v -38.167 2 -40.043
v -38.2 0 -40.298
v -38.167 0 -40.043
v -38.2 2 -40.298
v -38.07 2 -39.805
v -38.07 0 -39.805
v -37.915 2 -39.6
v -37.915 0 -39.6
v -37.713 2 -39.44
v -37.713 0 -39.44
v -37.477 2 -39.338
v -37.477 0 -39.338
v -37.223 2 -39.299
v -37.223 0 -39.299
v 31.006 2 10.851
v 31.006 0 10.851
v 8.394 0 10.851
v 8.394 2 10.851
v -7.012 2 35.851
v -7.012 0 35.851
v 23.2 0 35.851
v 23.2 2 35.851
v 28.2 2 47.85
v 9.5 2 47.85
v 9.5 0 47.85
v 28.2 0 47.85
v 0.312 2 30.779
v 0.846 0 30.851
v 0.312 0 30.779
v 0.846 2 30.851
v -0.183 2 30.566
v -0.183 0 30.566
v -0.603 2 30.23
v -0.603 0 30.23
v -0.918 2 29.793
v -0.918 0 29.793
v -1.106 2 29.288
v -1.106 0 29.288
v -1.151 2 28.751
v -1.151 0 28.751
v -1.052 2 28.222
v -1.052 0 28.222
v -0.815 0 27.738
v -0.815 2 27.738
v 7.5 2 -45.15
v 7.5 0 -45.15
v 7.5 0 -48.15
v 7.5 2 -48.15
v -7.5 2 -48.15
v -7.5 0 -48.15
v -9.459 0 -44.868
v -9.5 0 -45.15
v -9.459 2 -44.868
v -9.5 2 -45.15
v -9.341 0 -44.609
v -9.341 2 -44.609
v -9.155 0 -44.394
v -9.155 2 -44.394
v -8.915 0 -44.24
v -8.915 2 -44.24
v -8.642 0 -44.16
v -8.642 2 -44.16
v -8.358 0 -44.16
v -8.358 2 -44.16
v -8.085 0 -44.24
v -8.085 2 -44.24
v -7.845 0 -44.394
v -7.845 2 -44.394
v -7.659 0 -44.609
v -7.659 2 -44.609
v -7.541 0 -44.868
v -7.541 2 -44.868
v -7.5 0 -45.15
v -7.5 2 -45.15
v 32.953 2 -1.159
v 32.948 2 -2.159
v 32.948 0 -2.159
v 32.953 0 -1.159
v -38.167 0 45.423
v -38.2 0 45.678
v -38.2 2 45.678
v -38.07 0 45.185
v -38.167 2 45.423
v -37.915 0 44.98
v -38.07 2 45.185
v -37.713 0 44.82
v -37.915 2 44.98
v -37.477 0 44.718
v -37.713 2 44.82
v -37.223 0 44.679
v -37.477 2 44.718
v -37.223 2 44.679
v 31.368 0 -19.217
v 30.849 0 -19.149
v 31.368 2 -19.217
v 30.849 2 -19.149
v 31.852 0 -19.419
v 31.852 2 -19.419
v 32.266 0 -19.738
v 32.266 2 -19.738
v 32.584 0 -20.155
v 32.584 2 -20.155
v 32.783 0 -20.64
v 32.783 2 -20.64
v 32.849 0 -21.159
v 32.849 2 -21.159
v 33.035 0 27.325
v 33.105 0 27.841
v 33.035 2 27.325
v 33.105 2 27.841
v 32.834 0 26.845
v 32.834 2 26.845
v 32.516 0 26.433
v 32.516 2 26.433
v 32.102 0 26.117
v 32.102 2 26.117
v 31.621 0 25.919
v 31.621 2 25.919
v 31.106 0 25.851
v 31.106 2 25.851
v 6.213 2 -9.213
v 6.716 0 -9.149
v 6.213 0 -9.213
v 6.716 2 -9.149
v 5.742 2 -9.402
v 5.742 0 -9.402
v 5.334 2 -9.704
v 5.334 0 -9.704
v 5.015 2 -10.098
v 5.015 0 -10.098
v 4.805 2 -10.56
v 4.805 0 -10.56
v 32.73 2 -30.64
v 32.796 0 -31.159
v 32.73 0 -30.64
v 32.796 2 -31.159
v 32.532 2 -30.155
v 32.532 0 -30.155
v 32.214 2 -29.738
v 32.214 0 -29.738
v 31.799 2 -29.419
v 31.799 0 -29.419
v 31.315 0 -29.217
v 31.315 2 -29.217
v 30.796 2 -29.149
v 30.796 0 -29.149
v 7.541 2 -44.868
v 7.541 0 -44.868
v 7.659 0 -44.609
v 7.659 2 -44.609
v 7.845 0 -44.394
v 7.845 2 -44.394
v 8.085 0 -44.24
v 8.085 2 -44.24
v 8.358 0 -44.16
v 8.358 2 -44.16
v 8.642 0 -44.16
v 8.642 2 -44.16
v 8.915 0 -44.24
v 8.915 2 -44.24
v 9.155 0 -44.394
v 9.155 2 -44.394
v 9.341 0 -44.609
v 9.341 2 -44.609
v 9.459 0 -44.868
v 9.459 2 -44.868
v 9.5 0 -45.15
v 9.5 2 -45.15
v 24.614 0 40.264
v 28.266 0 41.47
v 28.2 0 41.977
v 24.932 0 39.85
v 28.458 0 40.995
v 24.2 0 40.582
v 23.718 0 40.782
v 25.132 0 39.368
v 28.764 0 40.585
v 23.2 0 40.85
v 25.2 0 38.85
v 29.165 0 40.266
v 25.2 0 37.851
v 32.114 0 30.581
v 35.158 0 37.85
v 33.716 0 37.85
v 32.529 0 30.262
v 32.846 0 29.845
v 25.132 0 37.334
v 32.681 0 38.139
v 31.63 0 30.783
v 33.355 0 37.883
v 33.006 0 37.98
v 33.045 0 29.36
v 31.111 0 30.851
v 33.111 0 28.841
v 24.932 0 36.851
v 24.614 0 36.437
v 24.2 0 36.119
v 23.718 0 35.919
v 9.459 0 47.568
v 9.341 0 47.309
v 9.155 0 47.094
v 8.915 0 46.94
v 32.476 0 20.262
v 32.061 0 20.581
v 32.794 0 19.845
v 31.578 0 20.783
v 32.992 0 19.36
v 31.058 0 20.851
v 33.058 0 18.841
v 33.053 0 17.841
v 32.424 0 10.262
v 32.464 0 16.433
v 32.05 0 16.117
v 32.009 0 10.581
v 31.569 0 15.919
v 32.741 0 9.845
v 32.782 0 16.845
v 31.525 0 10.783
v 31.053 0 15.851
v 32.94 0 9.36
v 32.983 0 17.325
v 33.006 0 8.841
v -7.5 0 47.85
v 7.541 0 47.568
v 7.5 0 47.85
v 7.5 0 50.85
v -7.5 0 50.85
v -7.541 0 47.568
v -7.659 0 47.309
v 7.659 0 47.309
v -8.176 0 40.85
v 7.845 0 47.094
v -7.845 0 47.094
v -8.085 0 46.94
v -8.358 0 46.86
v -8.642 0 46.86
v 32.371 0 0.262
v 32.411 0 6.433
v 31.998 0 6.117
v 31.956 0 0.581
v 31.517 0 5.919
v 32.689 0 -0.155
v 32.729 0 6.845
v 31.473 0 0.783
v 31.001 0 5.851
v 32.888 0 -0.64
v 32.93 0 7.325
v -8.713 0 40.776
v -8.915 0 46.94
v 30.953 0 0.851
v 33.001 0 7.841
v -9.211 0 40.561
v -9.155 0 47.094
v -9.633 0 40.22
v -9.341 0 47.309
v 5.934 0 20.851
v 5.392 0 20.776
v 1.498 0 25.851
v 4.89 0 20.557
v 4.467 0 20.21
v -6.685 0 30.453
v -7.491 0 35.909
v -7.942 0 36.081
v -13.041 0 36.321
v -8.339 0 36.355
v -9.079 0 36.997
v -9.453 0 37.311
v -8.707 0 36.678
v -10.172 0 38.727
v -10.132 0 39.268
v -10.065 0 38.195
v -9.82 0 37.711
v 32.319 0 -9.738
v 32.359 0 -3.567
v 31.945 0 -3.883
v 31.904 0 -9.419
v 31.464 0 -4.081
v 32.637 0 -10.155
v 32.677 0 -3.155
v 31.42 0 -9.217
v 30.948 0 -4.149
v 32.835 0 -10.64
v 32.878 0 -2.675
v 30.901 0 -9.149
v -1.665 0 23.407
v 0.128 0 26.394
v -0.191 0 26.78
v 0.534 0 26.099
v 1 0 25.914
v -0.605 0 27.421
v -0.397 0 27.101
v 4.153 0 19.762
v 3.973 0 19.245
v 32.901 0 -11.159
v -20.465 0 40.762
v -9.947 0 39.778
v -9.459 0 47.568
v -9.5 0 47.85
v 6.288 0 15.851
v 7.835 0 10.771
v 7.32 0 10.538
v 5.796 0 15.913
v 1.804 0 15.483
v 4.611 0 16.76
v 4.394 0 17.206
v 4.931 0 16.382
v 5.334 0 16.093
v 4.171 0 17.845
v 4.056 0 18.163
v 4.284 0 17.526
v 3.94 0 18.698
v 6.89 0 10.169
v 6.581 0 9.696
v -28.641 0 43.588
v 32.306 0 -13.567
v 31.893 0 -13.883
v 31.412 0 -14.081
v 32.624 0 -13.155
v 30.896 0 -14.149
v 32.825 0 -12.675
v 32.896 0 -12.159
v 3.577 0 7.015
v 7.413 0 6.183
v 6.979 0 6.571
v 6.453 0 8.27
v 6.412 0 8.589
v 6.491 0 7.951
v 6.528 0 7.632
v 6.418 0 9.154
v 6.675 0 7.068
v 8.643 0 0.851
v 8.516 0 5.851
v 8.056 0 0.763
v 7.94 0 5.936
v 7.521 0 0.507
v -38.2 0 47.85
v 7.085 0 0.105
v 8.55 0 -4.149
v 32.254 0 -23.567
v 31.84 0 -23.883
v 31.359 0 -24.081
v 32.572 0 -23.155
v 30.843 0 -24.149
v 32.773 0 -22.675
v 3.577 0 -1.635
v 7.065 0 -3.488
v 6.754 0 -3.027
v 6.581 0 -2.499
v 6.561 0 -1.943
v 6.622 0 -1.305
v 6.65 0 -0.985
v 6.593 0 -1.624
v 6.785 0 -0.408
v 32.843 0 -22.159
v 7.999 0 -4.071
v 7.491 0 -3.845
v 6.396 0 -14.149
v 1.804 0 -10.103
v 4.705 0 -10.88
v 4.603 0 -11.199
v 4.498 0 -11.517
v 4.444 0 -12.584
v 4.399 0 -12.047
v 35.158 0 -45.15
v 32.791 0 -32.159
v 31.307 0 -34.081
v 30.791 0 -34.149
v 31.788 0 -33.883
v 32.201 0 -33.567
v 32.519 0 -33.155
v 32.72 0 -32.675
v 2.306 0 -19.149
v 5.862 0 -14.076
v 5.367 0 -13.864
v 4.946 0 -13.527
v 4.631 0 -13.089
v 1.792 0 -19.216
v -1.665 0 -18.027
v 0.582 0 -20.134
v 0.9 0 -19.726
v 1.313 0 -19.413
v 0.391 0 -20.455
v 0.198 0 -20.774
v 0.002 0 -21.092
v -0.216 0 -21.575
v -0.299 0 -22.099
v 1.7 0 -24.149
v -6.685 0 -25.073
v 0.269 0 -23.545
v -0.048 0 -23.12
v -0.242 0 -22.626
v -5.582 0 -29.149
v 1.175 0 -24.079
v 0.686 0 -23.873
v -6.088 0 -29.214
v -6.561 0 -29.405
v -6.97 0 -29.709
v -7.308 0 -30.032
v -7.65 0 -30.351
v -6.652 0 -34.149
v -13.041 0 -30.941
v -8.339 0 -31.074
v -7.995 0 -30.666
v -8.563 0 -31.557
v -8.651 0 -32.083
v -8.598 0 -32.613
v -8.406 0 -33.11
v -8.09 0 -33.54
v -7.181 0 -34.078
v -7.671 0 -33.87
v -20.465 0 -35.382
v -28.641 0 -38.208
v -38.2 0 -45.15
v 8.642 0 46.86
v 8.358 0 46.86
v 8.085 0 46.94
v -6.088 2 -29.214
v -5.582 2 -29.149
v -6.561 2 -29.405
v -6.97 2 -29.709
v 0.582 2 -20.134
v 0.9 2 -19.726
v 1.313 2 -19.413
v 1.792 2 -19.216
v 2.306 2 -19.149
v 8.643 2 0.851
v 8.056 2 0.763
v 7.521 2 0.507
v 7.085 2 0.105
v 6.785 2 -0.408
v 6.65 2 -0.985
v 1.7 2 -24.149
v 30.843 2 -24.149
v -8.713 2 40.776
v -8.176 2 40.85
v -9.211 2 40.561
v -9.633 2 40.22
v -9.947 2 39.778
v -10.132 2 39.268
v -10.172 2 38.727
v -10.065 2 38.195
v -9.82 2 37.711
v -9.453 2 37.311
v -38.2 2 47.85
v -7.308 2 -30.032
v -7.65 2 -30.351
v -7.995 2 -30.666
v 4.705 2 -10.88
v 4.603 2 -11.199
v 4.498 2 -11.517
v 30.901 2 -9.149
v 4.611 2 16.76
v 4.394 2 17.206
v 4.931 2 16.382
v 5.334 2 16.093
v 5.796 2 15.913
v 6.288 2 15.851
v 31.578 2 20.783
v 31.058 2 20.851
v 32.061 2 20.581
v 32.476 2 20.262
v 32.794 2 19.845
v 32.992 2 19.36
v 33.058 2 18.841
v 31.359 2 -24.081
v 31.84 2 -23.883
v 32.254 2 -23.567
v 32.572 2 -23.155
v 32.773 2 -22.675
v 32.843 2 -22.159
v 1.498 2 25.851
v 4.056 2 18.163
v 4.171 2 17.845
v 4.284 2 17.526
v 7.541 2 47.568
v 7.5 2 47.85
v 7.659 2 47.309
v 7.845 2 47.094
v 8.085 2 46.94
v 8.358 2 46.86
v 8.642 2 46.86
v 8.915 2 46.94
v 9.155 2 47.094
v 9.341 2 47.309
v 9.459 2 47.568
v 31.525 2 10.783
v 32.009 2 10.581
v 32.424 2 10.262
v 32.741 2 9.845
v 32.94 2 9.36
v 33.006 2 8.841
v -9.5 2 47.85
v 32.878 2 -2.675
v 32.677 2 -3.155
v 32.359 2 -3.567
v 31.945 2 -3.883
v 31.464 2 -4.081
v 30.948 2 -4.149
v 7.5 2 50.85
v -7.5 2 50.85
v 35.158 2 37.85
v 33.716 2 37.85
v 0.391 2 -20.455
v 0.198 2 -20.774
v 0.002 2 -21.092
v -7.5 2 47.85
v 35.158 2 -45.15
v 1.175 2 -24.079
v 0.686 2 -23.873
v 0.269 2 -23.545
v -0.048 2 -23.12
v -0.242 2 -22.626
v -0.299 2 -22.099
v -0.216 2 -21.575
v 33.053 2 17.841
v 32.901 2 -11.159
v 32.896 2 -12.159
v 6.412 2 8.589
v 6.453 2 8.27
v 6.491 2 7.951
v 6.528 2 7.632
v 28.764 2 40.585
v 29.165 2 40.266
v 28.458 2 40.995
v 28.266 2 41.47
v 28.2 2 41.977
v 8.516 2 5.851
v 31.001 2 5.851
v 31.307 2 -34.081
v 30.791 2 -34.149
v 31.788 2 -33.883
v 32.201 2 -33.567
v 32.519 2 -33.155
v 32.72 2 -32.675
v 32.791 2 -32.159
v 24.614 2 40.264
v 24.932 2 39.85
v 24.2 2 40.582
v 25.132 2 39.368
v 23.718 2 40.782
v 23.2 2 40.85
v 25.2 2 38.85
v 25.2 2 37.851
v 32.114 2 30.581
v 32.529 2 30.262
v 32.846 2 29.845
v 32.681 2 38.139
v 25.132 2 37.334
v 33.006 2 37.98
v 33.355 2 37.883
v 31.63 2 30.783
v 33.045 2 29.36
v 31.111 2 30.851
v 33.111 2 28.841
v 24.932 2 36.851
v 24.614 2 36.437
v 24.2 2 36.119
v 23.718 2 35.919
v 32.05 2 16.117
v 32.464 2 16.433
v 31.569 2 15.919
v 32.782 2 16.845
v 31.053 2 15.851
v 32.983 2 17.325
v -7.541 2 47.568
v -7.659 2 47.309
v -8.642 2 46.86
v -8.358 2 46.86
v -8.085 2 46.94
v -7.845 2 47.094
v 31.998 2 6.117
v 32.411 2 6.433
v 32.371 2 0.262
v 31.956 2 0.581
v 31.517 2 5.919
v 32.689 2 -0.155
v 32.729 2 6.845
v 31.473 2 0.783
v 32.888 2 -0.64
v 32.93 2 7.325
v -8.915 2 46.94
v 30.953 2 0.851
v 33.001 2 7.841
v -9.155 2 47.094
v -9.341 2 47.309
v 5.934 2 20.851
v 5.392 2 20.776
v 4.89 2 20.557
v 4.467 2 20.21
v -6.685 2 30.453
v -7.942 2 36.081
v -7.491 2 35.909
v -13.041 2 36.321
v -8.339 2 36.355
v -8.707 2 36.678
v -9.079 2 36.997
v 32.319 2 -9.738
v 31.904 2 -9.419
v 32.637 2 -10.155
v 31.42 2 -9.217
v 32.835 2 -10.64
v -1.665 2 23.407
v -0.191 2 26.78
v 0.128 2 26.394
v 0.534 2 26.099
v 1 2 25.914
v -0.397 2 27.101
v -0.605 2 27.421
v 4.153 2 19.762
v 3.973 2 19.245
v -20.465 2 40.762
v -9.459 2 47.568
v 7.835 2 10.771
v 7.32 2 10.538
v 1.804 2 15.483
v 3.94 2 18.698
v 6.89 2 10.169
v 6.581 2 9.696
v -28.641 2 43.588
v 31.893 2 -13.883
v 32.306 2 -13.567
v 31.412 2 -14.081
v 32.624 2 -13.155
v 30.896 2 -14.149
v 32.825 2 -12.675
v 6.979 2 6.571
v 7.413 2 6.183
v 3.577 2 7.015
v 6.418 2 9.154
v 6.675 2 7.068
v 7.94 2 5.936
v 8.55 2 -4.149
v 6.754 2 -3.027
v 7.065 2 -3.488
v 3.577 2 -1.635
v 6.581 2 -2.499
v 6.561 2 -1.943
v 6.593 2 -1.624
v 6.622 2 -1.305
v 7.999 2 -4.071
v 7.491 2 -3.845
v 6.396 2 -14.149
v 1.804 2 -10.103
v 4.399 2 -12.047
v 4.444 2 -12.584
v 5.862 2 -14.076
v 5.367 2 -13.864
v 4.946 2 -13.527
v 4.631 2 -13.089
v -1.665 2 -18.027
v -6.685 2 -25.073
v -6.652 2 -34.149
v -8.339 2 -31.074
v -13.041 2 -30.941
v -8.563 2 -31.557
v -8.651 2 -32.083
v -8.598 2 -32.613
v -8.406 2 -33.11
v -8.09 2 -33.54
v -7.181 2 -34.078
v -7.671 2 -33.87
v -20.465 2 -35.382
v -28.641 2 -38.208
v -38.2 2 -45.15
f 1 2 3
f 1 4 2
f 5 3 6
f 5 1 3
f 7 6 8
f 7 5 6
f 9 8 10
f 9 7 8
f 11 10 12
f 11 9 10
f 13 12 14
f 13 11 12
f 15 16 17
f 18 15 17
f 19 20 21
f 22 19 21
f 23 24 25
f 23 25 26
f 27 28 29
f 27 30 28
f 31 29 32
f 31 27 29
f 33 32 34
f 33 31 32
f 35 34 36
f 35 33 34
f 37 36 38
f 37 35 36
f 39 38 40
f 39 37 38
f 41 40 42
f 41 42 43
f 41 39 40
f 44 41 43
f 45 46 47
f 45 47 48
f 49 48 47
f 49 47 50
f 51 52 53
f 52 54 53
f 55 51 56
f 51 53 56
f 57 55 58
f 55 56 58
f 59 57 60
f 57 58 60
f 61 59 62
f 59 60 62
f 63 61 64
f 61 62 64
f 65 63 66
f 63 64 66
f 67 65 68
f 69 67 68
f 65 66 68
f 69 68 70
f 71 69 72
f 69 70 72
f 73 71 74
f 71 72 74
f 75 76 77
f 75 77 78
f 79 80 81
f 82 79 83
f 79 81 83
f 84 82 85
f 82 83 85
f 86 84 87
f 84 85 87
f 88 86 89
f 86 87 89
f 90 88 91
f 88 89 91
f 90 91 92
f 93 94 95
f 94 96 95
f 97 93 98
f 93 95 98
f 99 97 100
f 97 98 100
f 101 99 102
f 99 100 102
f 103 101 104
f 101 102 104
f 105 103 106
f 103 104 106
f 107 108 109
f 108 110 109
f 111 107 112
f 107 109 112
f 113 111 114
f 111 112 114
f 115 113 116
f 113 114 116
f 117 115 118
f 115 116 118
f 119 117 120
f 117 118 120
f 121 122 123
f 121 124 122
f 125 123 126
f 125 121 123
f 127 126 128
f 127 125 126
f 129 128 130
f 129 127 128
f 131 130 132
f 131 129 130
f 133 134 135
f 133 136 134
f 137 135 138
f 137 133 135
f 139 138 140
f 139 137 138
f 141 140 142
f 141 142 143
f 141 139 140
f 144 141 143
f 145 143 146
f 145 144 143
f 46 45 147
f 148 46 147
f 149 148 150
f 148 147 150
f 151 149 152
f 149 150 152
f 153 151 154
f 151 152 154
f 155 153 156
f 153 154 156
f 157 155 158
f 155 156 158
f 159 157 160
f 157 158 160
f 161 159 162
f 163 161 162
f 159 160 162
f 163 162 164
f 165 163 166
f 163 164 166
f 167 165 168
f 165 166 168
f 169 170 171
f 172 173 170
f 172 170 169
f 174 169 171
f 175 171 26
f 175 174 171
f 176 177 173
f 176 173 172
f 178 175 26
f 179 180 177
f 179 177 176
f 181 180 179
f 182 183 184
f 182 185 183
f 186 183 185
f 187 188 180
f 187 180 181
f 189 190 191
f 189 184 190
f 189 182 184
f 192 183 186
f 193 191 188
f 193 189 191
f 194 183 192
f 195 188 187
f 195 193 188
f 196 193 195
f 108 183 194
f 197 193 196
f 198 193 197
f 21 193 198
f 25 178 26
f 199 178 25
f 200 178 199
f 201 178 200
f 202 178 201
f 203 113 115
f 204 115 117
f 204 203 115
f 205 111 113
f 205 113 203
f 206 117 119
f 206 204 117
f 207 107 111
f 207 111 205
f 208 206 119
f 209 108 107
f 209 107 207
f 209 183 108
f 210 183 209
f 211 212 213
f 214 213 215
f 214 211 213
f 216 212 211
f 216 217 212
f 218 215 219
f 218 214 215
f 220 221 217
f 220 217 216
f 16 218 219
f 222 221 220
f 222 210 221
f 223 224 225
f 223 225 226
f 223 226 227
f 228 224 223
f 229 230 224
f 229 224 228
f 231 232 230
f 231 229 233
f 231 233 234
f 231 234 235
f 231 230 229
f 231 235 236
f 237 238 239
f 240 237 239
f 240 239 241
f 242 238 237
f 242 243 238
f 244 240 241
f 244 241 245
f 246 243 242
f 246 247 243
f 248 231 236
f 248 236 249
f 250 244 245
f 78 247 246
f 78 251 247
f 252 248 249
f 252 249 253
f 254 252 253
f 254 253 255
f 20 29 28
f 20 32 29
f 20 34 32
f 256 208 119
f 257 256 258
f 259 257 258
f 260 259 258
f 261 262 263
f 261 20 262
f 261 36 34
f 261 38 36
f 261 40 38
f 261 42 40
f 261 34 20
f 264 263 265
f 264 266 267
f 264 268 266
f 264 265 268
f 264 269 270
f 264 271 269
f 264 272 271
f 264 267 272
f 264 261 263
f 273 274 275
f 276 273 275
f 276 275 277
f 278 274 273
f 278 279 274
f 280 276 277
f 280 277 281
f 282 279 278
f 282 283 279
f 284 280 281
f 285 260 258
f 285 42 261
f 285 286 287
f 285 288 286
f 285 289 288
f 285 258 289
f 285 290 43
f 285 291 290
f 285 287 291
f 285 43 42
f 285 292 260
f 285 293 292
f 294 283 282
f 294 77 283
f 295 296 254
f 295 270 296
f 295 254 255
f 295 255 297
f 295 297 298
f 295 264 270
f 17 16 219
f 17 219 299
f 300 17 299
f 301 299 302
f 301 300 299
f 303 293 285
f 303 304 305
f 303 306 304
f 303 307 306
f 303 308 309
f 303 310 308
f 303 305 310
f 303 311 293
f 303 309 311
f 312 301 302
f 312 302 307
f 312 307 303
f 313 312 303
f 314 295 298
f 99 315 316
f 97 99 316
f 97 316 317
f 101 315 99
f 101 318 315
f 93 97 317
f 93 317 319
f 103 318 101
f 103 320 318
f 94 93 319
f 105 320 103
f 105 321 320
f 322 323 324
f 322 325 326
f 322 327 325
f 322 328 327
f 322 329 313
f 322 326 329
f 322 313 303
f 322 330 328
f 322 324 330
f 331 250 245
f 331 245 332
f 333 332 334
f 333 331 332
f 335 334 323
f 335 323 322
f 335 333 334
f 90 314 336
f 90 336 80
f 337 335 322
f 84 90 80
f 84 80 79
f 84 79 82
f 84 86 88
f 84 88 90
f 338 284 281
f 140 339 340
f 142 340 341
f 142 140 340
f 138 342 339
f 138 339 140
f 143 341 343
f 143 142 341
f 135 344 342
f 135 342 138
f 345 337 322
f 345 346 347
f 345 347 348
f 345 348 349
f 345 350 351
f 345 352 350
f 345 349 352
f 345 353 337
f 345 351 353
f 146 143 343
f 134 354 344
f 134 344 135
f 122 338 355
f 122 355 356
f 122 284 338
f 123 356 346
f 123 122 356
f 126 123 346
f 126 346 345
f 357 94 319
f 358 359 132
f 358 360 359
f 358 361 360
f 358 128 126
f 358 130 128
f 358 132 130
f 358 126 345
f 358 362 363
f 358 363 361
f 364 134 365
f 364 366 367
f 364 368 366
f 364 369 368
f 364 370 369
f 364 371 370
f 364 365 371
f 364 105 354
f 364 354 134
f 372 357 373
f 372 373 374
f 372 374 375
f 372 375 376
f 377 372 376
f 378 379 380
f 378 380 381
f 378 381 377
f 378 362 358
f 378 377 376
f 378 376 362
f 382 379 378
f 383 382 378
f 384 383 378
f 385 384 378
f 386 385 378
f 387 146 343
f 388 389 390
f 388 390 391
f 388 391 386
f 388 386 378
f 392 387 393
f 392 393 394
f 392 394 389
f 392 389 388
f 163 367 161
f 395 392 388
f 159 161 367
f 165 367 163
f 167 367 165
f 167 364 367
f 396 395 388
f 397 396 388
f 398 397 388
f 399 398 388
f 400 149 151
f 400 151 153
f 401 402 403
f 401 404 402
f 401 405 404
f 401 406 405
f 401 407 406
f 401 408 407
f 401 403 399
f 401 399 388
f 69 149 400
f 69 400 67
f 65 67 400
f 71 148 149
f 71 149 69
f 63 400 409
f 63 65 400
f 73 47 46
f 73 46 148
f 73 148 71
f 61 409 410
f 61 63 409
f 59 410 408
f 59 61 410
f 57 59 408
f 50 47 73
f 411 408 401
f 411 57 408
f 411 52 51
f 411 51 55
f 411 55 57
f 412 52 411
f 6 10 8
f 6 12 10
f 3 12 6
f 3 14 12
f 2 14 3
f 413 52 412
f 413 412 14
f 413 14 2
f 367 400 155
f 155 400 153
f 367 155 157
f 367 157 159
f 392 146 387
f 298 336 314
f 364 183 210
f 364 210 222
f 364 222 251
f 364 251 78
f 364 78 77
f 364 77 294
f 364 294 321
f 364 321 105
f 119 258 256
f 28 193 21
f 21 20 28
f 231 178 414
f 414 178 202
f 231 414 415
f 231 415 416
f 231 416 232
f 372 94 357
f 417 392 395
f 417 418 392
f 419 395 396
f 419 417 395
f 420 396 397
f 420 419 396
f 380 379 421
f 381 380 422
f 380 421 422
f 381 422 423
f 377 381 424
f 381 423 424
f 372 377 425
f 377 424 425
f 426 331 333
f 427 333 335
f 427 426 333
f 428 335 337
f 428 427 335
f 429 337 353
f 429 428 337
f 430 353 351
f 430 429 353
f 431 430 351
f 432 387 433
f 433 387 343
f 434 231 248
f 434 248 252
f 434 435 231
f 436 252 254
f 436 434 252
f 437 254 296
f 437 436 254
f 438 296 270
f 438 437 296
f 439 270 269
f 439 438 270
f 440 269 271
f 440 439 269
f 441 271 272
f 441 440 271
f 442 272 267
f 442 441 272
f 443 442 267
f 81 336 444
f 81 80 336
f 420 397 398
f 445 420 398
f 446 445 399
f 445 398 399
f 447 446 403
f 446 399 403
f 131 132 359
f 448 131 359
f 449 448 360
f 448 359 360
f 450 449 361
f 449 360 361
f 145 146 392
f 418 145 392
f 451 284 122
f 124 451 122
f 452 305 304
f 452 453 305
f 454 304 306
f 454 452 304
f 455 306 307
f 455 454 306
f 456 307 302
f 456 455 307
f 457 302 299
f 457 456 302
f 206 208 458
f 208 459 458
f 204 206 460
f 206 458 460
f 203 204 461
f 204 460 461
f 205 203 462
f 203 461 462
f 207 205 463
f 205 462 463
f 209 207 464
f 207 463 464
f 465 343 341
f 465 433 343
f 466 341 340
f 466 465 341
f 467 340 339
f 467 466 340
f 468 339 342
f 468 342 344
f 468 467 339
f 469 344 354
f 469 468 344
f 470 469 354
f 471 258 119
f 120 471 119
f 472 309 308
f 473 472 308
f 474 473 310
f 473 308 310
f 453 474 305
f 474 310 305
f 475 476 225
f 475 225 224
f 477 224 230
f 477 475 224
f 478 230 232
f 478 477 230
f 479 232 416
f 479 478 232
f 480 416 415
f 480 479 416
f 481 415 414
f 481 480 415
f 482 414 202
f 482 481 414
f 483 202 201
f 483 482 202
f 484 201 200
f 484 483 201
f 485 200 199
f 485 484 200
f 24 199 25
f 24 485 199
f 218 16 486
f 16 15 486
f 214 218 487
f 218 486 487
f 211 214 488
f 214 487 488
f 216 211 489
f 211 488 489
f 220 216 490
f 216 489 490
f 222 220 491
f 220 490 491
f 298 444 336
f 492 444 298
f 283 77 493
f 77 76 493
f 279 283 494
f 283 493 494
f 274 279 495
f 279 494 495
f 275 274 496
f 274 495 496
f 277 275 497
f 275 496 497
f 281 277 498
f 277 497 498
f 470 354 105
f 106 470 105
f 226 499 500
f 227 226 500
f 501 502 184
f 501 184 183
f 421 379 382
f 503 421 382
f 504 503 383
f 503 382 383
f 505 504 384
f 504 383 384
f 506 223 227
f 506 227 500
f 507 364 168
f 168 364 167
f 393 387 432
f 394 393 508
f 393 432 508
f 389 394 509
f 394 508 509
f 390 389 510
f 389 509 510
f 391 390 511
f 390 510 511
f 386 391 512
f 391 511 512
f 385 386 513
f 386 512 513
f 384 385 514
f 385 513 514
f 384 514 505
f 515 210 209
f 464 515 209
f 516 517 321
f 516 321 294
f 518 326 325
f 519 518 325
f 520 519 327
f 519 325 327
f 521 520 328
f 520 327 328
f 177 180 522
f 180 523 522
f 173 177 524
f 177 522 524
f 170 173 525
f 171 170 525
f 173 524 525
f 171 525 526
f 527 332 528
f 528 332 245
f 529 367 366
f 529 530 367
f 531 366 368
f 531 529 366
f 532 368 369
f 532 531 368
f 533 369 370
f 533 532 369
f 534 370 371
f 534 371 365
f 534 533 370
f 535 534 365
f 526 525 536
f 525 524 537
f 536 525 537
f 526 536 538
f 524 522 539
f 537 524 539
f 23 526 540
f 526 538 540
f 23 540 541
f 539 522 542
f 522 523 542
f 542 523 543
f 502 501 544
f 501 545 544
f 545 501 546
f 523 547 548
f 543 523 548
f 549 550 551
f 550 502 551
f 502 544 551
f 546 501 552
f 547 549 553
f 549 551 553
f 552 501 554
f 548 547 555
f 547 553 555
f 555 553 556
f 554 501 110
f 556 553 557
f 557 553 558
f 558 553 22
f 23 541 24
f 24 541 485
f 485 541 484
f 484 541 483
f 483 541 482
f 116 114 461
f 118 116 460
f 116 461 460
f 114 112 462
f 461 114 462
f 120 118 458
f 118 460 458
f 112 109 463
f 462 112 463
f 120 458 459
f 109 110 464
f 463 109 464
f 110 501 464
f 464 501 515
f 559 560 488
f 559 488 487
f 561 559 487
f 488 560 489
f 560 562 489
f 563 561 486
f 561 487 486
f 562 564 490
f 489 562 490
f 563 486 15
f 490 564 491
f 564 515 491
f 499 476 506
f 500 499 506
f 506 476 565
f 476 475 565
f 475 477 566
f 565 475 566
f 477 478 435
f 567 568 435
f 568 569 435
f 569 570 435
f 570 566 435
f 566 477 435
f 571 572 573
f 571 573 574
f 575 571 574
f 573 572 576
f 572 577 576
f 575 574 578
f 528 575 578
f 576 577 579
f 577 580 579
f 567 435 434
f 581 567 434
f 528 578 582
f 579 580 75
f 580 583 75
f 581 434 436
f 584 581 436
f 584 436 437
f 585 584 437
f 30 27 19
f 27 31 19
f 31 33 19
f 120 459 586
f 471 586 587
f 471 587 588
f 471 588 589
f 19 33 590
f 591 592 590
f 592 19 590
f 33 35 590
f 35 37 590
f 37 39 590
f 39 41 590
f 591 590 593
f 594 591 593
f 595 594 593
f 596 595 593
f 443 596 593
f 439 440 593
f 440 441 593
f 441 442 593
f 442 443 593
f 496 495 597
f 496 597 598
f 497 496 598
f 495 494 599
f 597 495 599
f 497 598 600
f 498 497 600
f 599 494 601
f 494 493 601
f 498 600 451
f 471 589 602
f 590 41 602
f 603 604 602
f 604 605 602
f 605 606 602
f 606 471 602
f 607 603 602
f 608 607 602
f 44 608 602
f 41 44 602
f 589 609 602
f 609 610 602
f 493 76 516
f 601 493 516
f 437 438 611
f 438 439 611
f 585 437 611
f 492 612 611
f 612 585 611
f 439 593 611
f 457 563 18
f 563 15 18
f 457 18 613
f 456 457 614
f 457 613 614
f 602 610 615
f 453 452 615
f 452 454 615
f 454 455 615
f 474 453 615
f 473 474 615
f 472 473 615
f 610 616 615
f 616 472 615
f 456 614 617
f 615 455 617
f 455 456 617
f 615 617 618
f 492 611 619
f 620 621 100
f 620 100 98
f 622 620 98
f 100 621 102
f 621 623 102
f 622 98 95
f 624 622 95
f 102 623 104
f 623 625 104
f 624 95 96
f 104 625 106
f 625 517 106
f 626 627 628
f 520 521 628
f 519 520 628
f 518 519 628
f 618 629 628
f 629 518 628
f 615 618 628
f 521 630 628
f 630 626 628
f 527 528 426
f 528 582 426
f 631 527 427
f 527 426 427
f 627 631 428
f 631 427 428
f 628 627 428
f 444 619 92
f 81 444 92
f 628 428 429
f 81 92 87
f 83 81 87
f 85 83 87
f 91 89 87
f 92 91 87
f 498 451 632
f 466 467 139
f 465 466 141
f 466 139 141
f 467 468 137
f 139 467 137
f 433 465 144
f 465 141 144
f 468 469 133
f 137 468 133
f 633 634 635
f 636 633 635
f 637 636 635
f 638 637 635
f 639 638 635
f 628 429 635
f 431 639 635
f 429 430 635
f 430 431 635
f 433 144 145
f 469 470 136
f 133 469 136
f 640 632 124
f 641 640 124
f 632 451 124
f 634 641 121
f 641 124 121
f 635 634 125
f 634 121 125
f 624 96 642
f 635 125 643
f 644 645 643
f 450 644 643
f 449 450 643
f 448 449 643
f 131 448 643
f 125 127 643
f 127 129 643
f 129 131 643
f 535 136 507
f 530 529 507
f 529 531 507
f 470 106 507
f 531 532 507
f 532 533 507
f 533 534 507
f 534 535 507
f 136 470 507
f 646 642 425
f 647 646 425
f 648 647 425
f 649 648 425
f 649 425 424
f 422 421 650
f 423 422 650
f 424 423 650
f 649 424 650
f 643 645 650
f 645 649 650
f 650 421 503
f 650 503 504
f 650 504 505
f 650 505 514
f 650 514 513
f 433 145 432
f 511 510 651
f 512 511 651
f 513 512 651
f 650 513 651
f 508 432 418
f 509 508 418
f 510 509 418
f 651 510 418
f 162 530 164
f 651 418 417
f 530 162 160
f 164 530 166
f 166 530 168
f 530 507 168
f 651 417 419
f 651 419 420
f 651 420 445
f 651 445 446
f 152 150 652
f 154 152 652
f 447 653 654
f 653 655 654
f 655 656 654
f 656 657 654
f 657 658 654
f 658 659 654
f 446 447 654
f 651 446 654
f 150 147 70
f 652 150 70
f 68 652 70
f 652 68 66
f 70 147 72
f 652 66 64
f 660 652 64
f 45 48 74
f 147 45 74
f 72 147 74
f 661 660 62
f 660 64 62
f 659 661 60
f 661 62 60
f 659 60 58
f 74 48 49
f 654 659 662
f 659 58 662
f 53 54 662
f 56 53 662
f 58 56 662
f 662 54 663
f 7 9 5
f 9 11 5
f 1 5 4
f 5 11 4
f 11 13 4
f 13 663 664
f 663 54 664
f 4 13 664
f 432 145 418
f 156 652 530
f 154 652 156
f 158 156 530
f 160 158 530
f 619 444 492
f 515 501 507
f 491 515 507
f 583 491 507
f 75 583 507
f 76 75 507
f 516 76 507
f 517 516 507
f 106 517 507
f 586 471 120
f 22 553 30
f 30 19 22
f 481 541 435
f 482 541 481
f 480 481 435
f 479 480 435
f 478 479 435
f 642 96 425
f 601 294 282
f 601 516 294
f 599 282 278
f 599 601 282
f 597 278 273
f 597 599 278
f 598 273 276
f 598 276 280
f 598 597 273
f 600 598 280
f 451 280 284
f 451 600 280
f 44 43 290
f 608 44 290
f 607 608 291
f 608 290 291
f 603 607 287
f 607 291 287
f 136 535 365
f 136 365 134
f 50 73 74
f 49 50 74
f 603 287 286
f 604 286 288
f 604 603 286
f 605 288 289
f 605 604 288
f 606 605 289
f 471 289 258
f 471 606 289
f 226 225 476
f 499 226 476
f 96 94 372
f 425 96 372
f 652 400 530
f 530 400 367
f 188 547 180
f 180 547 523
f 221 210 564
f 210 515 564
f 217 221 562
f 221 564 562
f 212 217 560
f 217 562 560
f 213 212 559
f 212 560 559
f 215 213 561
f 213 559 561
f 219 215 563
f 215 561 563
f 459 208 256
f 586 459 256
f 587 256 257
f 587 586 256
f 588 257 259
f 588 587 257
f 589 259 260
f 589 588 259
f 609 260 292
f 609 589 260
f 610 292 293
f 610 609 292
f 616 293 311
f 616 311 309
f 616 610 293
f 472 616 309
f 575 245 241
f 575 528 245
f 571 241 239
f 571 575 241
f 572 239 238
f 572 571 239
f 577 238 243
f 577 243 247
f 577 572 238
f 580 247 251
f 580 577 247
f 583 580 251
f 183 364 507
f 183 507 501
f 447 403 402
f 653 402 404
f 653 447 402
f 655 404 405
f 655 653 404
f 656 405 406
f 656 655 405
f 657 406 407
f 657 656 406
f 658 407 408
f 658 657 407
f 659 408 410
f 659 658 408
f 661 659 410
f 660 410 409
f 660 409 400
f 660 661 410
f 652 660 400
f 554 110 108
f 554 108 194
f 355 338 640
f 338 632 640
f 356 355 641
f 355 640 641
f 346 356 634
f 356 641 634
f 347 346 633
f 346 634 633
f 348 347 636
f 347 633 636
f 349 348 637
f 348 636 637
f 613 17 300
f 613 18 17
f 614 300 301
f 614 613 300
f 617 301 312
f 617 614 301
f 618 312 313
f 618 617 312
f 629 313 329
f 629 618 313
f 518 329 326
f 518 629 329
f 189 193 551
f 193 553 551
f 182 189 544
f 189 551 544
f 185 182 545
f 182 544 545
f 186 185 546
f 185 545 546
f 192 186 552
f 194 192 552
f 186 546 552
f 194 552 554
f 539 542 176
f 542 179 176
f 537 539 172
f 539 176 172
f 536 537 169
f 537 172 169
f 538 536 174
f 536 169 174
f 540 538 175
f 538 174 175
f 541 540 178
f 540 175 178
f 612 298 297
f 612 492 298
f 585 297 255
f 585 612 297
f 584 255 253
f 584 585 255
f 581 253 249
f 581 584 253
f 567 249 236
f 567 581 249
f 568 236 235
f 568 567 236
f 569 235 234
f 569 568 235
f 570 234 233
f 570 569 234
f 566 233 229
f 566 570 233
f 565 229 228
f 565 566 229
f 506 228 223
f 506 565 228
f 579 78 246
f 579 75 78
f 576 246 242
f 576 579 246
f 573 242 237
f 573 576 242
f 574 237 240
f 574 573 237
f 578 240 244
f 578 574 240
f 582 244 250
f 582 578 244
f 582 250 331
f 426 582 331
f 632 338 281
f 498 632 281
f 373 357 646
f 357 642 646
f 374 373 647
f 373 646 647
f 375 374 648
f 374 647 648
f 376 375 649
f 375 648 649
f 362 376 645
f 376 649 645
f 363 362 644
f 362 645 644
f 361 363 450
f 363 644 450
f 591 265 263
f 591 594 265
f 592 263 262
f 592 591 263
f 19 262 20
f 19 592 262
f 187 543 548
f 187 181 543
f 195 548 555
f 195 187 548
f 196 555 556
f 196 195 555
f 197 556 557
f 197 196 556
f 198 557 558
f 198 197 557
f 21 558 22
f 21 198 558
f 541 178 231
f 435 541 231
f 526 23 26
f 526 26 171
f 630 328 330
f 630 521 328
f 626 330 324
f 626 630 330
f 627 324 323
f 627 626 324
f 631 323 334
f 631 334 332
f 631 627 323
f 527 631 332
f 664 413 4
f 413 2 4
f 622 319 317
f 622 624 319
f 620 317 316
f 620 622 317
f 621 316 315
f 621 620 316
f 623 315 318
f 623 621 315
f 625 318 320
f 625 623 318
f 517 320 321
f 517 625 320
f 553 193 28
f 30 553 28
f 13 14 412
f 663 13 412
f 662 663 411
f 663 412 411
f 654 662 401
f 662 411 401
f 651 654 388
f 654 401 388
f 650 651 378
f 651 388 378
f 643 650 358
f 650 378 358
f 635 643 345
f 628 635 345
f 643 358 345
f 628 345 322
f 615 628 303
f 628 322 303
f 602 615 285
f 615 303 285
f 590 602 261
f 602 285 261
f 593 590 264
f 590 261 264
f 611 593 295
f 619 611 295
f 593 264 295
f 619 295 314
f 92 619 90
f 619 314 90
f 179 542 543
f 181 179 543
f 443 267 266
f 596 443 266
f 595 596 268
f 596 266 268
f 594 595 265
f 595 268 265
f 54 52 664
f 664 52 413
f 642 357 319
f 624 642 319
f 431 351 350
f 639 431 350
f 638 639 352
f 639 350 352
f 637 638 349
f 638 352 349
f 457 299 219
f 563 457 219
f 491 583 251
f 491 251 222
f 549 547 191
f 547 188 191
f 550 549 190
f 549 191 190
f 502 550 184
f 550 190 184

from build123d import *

# Parameters (mm, degrees)
EXTRUDE_1_DEPTH          = 2
SKETCH_3_W               = 76.4
SKETCH_3_H               = 2
EXTRUDE_2_DEPTH          = 7
CUT_EXTRUDE_1_DEPTH      = 10
EXTRUDE_4_DEPTH          = 2
PATTERN_LINEAR_2_COUNT   = 2
PATTERN_LINEAR_2_PITCH   = 32
FILLET_3_R               = 0.5
CUT_EXTRUDE_2_DEPTH      = 10
EXTRUDE_5_DEPTH          = 2
CUT_EXTRUDE_3_DEPTH      = 10
CUT_EXTRUDE_4_DEPTH      = 10
FILLET_5_R               = 2
EXTRUDE_9_DEPTH          = 2
FILLET_6_R               = 2
FILLET_7_R               = 1
SKETCH_18_W              = 76.4
SKETCH_18_H              = 2
EXTRUDE_6_DEPTH          = 2
SKETCH_19_W              = 10
SKETCH_19_H              = 10
CUT_EXTRUDE_5_DEPTH      = 3
EXTRUDE_8_DEPTH          = 2
FILLET_8_R               = 2
FILLET_9_R               = 2
SKETCH_21_W              = 3
SKETCH_21_H              = 87.342834434
CUT_EXTRUDE_6_DEPTH      = 3
CUT_EXTRUDE_7_DEPTH      = 1
CUT_EXTRUDE_7_DEPTH_BACK = 3
SKETCH_24_W              = 15
SKETCH_24_H              = 2
EXTRUDE_10_DEPTH         = 3
SKETCH_25_R              = 1
CUT_EXTRUDE_8_DEPTH      = 3


with BuildPart() as part:
    # 草图1 → 凸台-拉伸1 (new body)
    with BuildSketch(Plane(origin=(0, 0, 0), x_dir=(1, 0, 0), z_dir=(0, 1, 0))):
        with BuildLine():
            Line((-38.2, -44.69), (-38.2, -45.85))
            Line((-38.2, -45.85), (38.2, -45.85))
            Line((38.2, -45.85), (38.2, 45.85))
            Line((38.2, 45.85), (-38.2, 45.85))
            Line((-38.2, 45.85), (-38.2, 39.31))
            ThreePointArc((-38.2, 39.31), (3.8, -2.69), (-38.2, -44.69))
        make_face()
    extrude(amount=EXTRUDE_1_DEPTH)

    # 草图3 → 凸台-拉伸2 (add)
    with BuildSketch(Plane(origin=(0, 0, -45.85), x_dir=(-1, 0, 0), z_dir=(0, 0, -1))):
        with Locations((0, 1)):
            Rectangle(SKETCH_3_W, SKETCH_3_H)
    extrude(amount=EXTRUDE_2_DEPTH)

    # 草图5 → 切除-拉伸1 (cut)
    with BuildSketch(Plane(origin=(0, 2, 0), x_dir=(1, 0, 0), z_dir=(0, 1, 0))):
        Polygon((-38.2, 51.26), (38.2, 52.85), (-38.2, 52.85), align=None)
    extrude(amount=-CUT_EXTRUDE_1_DEPTH, mode=Mode.SUBTRACT)

    # 草图7 → 凸台-拉伸4 (add)
    with BuildSketch(Plane.XZ):
        Polygon((25.6, -52.587774869), (25.6, -54.754790576), (9.6, -54.754790576), (9.6, -52.254790576), align=None)
    extrude_4 = extrude(amount=-EXTRUDE_4_DEPTH)

    # 阵列(线性)2: 凸台-拉伸4 ×2
    with Locations(*[Vector(-0.999783511, 0, 0.020807013) * (i * PATTERN_LINEAR_2_PITCH) for i in range(1, PATTERN_LINEAR_2_COUNT)]):
        add(extrude_4)

    # 圆角3
    fillet_3_edges = [part.edges().sort_by_distance(p)[0] for p in [
        (25.6, 1, -54.754790576),
        (9.6, 1, -54.754790576),
        (-6.393072342, 1, -54.088966165),
        (-22.393072342, 1, -54.088966165),
    ]]
    fillet(fillet_3_edges, radius=FILLET_3_R)

    # 草图10 → 切除-拉伸2 (cut)
    with BuildSketch(Plane(origin=(0, 2, 0), x_dir=(1, 0, 0), z_dir=(0, 1, 0))):
        Polygon((-38.882265213, 53.905585721), (39.585789662, 55.538625083), (39.585789662, 48.538625083), (-38.2, 46.919784696), (-39.22769149, 52.889737929), align=None)
    extrude(amount=-CUT_EXTRUDE_2_DEPTH, mode=Mode.SUBTRACT)

    # 草图11 → 凸台-拉伸5 (add)
    with BuildSketch(Plane(origin=(0, 2, 0), x_dir=(1, 0, 0), z_dir=(0, 1, 0))):
        Polygon((-38.2, 46.919784696), (38.2, 49.509784696), (38.2, 48.509784696), align=None)
    extrude(amount=-EXTRUDE_5_DEPTH)

    # 草图13 → 切除-拉伸3 (cut)
    with BuildSketch(Plane.XZ):
        Polygon((38.2, -49.509784696), (37.7, -49.492834434), (38.2, 45.85), align=None)
    extrude(amount=-CUT_EXTRUDE_3_DEPTH, mode=Mode.SUBTRACT)

    # 草图16 → 切除-拉伸4 (cut)
    with BuildSketch(Plane.XZ):
        with BuildLine():
            ThreePointArc((-21.63159016, -39.14883119), (-26.948214114, -40.880601492), (-32.438562967, -41.939652064))
            Line((-32.438562967, -41.939652064), (32.727956442, -44.14883119))
            Line((32.727956442, -44.14883119), (32.754177605, -39.14883119))
            Line((32.754177605, -39.14883119), (-21.63159016, -39.14883119))
        make_face()
        with BuildLine():
            ThreePointArc((-6.399232266, -29.14883119), (-9.26951053, -31.777764346), (-12.35622867, -34.14883119))
            Line((-12.35622867, -34.14883119), (32.780398767, -34.14883119))
            Line((32.780398767, -34.14883119), (32.80661993, -29.14883119))
            Line((32.80661993, -29.14883119), (-6.399232266, -29.14883119))
        make_face()
        with BuildLine():
            ThreePointArc((1.145462918, -19.14883119), (-0.38438284, -21.702193399), (-2.079685213, -24.14883119))
            Line((-2.079685213, -24.14883119), (32.832841093, -24.14883119))
            Line((32.832841093, -24.14883119), (32.859062256, -19.14883119))
            Line((32.859062256, -19.14883119), (1.145462918, -19.14883119))
        make_face()
        with BuildLine():
            ThreePointArc((5.214767949, -9.14883119), (4.446089194, -11.673532869), (3.530729255, -14.14883119))
            Line((3.530729255, -14.14883119), (32.885283419, -14.14883119))
            Line((32.885283419, -14.14883119), (32.911504582, -9.14883119))
            Line((32.911504582, -9.14883119), (5.214767949, -9.14883119))
        make_face()
        with BuildLine():
            Line((32.937725745, -4.14883119), (32.963946908, 0.85116881))
            Line((32.963946908, 0.85116881), (6.762414302, 0.85116881))
            ThreePointArc((6.762414302, 0.85116881), (6.58968308, -1.65560578), (6.277301941, -4.14883119))
            Line((6.277301941, -4.14883119), (32.937725745, -4.14883119))
        make_face()
        with BuildLine():
            Line((33.016389234, 10.85116881), (6.053760559, 10.85116881))
            ThreePointArc((6.053760559, 10.85116881), (6.441352349, 8.360067057), (6.688829476, 5.85116881))
            Line((6.688829476, 5.85116881), (32.990168071, 5.85116881))
            Line((32.990168071, 5.85116881), (33.016389234, 10.85116881))
        make_face()
        with BuildLine():
            Line((33.06883156, 20.85116881), (2.97246589, 20.85116881))
            ThreePointArc((2.97246589, 20.85116881), (3.976569254, 18.378754125), (4.832355682, 15.85116881))
            Line((4.832355682, 15.85116881), (33.042610397, 15.85116881))
            Line((33.042610397, 15.85116881), (33.06883156, 20.85116881))
        make_face()
        with BuildLine():
            Line((33.121273886, 30.85116881), (-3.100875064, 30.85116881))
            ThreePointArc((-3.100875064, 30.85116881), (-1.274777634, 28.410185715), (0.381864384, 25.85116881))
            Line((0.381864384, 25.85116881), (33.095052723, 25.85116881))
            Line((33.095052723, 25.85116881), (33.121273886, 30.85116881))
        make_face()
        with BuildLine():
            Line((33.173710083, 40.85), (-14.350169812, 40.85))
            ThreePointArc((-14.350169812, 40.85), (-10.950539992, 38.501547429), (-7.780649528, 35.85116881))
            Line((-7.780649528, 35.85116881), (33.147495049, 35.85116881))
            Line((33.147495049, 35.85116881), (33.173710083, 40.85))
        make_face()
    extrude(amount=-CUT_EXTRUDE_4_DEPTH, mode=Mode.SUBTRACT)

    # 圆角5
    fillet_5_edges = [part.edges().sort_by_distance(p)[0] for p in [
        (-21.63159016, 1, -39.14883119),
        (32.754177605, 1, -39.14883119),
        (32.727956442, 1, -44.14883119),
        (-6.399232266, 1, -29.14883119),
        (32.80661993, 1, -29.14883119),
        (32.780398767, 1, -34.14883119),
        (-2.079685213, 1, -24.14883119),
        (3.530729255, 1, -14.14883119),
        (5.214767949, 1, -9.14883119),
        (32.911504582, 1, -9.14883119),
        (32.885283419, 1, -14.14883119),
        (32.937725745, 1, -4.14883119),
        (6.688829476, 1, 5.85116881),
        (33.016389234, 1, 10.85116881),
        (32.990168071, 1, 5.85116881),
        (4.832355682, 1, 15.85116881),
        (2.97246589, 1, 20.85116881),
        (0.381864384, 1, 25.85116881),
        (-3.100875064, 1, 30.85116881),
        (33.121273886, 1, 30.85116881),
        (-14.350169812, 1, 40.85),
        (33.173710083, 1, 40.85),
    ]]
    fillet(fillet_5_edges, radius=FILLET_5_R)

    # 草图23 → 凸台-拉伸9 (add)
    with BuildSketch(Plane.XZ):
        with BuildLine():
            Line((30.743661638, -39.14883119), (-21.254296123, -39.14883119))
            ThreePointArc((-21.254296123, -39.14883119), (-21.621062836, -39.182748237), (-21.975389905, -39.283349012))
            ThreePointArc((-21.975389905, -39.283349012), (-27.127035015, -40.926389654), (-32.438562967, -41.939652064))
            Line((-32.438562967, -41.939652064), (30.67101495, -44.079099797))
            ThreePointArc((30.67101495, -44.079099797), (32.125051399, -43.521859473), (32.738749569, -42.090736373))
            Line((32.738749569, -42.090736373), (32.743634136, -41.159319511))
            ThreePointArc((32.743634136, -41.159319511), (32.161578532, -39.738330684), (30.743661638, -39.14883119))
        make_face()
    extrude(amount=-EXTRUDE_9_DEPTH)

    # 圆角6
    fillet_6_edges = [part.edges().sort_by_distance(p)[0] for p in [
        (-12.35622867, 1, -34.14883119),
        (1.145462918, 1, -19.14883119),
        (32.859062256, 1, -19.14883119),
        (32.832841093, 1, -24.14883119),
        (6.277301941, 1, -4.14883119),
        (6.762414302, 1, 0.85116881),
        (32.963946908, 1, 0.85116881),
        (6.053760559, 1, 10.85116881),
        (33.06883156, 1, 20.85116881),
        (33.042610397, 1, 15.85116881),
        (33.095052723, 1, 25.85116881),
        (-7.780649528, 1, 35.85116881),
        (33.147495049, 1, 35.85116881),
    ]]
    fillet(fillet_6_edges, radius=FILLET_6_R)

    # 圆角7
    fillet_7_edges = [part.edges().sort_by_distance(p)[0] for p in [
        (-38.2, 1, 44.69),
        (-38.2, 1, -39.31),
        (-38.2, 1, -46.919784696),
    ]]
    fillet(fillet_7_edges, radius=FILLET_7_R)

    # 草图18 → 凸台-拉伸6 (add)
    with BuildSketch(Plane.XY.offset(45.85)):
        with Locations((0, 1)):
            Rectangle(SKETCH_18_W, SKETCH_18_H)
    extrude(amount=EXTRUDE_6_DEPTH)

    # 草图19 → 切除-拉伸5 (cut, through all)
    with BuildSketch(Plane(origin=(0, 2, 0), x_dir=(1, 0, 0), z_dir=(0, 1, 0))):
        with Locations((33.2, -42.85)):
            Rectangle(SKETCH_19_W, SKETCH_19_H)
    extrude(amount=-CUT_EXTRUDE_5_DEPTH, mode=Mode.SUBTRACT)

    # 草图20 → 凸台-拉伸8 (add)
    with BuildSketch(Plane(origin=(0, 2, 0), x_dir=(1, 0, 0), z_dir=(0, 1, 0))):
        Polygon((25.2, -35.85116881), (33.157977385, -35.85116881), (33.157977385, -37.85), (28.2, -40.85), (25.2, -40.85), align=None)
    extrude(amount=-EXTRUDE_8_DEPTH)

    # 圆角8
    fillet_8_edges = [part.edges().sort_by_distance(p)[0] for p in [
        (25.2, 1, 40.85),
        (25.2, 1, 35.85116881),
    ]]
    fillet(fillet_8_edges, radius=FILLET_8_R)

    # 圆角9
    fillet_9_edges = [part.edges().sort_by_distance(p)[0] for p in [
        (33.157977385, 1, 37.85),
        (28.2, 1, 40.85),
    ]]
    fillet(fillet_9_edges, radius=FILLET_9_R)

    # 草图21 → 切除-拉伸6 (cut, through all)
    with BuildSketch(Plane.XZ):
        with Locations((36.658046139, -5.821417217)):
            Rectangle(SKETCH_21_W, SKETCH_21_H)
    extrude(amount=-CUT_EXTRUDE_6_DEPTH, mode=Mode.SUBTRACT)

    # 草图22 → 切除-拉伸7 (cut, two sides)
    with BuildSketch(Plane.XZ) as cut_extrude_7_sk:
        Polygon((-290.579437235, -45.15), (-39.244125604, -45.15), (60.755874396, -45.15), (60.755874396, -51.15), (-39.244125604, -51.15), (-39.244125604, -47.15), (-39.244125604, 204.185311631), (314.77499341, -152.673510404), (63.439681778, -402.008822036), align=None)
    extrude(amount=CUT_EXTRUDE_7_DEPTH, mode=Mode.SUBTRACT)
    extrude(cut_extrude_7_sk.sketch, amount=-CUT_EXTRUDE_7_DEPTH_BACK, mode=Mode.SUBTRACT)

    # 草图24 → 凸台-拉伸10 (add)
    with BuildSketch(Plane(origin=(0, 0, -45.15), x_dir=(-1, 0, 0), z_dir=(0, 0, -1))):
        with Locations((0, 1)):
            Rectangle(SKETCH_24_W, SKETCH_24_H)
    extrude_10 = extrude(amount=EXTRUDE_10_DEPTH)

    # 草图25 → 切除-拉伸8 (cut, through all)
    with BuildSketch(Plane(origin=(0, 2, 0), x_dir=(1, 0, 0), z_dir=(0, 1, 0))):
        with Locations((-8.5, 45.15)):
            Circle(SKETCH_25_R)
        with Locations((8.5, 45.15)):
            Circle(SKETCH_25_R)
    cut_extrude_8 = extrude(amount=-CUT_EXTRUDE_8_DEPTH, mode=Mode.SUBTRACT)

    # 镜向1: 凸台-拉伸10, 切除-拉伸8 across plane
    add(extrude_10.mirror(Plane.XY.offset(1.35)))
    add(cut_extrude_8.mirror(Plane.XY.offset(1.35)), mode=Mode.SUBTRACT)


solid = part.part
